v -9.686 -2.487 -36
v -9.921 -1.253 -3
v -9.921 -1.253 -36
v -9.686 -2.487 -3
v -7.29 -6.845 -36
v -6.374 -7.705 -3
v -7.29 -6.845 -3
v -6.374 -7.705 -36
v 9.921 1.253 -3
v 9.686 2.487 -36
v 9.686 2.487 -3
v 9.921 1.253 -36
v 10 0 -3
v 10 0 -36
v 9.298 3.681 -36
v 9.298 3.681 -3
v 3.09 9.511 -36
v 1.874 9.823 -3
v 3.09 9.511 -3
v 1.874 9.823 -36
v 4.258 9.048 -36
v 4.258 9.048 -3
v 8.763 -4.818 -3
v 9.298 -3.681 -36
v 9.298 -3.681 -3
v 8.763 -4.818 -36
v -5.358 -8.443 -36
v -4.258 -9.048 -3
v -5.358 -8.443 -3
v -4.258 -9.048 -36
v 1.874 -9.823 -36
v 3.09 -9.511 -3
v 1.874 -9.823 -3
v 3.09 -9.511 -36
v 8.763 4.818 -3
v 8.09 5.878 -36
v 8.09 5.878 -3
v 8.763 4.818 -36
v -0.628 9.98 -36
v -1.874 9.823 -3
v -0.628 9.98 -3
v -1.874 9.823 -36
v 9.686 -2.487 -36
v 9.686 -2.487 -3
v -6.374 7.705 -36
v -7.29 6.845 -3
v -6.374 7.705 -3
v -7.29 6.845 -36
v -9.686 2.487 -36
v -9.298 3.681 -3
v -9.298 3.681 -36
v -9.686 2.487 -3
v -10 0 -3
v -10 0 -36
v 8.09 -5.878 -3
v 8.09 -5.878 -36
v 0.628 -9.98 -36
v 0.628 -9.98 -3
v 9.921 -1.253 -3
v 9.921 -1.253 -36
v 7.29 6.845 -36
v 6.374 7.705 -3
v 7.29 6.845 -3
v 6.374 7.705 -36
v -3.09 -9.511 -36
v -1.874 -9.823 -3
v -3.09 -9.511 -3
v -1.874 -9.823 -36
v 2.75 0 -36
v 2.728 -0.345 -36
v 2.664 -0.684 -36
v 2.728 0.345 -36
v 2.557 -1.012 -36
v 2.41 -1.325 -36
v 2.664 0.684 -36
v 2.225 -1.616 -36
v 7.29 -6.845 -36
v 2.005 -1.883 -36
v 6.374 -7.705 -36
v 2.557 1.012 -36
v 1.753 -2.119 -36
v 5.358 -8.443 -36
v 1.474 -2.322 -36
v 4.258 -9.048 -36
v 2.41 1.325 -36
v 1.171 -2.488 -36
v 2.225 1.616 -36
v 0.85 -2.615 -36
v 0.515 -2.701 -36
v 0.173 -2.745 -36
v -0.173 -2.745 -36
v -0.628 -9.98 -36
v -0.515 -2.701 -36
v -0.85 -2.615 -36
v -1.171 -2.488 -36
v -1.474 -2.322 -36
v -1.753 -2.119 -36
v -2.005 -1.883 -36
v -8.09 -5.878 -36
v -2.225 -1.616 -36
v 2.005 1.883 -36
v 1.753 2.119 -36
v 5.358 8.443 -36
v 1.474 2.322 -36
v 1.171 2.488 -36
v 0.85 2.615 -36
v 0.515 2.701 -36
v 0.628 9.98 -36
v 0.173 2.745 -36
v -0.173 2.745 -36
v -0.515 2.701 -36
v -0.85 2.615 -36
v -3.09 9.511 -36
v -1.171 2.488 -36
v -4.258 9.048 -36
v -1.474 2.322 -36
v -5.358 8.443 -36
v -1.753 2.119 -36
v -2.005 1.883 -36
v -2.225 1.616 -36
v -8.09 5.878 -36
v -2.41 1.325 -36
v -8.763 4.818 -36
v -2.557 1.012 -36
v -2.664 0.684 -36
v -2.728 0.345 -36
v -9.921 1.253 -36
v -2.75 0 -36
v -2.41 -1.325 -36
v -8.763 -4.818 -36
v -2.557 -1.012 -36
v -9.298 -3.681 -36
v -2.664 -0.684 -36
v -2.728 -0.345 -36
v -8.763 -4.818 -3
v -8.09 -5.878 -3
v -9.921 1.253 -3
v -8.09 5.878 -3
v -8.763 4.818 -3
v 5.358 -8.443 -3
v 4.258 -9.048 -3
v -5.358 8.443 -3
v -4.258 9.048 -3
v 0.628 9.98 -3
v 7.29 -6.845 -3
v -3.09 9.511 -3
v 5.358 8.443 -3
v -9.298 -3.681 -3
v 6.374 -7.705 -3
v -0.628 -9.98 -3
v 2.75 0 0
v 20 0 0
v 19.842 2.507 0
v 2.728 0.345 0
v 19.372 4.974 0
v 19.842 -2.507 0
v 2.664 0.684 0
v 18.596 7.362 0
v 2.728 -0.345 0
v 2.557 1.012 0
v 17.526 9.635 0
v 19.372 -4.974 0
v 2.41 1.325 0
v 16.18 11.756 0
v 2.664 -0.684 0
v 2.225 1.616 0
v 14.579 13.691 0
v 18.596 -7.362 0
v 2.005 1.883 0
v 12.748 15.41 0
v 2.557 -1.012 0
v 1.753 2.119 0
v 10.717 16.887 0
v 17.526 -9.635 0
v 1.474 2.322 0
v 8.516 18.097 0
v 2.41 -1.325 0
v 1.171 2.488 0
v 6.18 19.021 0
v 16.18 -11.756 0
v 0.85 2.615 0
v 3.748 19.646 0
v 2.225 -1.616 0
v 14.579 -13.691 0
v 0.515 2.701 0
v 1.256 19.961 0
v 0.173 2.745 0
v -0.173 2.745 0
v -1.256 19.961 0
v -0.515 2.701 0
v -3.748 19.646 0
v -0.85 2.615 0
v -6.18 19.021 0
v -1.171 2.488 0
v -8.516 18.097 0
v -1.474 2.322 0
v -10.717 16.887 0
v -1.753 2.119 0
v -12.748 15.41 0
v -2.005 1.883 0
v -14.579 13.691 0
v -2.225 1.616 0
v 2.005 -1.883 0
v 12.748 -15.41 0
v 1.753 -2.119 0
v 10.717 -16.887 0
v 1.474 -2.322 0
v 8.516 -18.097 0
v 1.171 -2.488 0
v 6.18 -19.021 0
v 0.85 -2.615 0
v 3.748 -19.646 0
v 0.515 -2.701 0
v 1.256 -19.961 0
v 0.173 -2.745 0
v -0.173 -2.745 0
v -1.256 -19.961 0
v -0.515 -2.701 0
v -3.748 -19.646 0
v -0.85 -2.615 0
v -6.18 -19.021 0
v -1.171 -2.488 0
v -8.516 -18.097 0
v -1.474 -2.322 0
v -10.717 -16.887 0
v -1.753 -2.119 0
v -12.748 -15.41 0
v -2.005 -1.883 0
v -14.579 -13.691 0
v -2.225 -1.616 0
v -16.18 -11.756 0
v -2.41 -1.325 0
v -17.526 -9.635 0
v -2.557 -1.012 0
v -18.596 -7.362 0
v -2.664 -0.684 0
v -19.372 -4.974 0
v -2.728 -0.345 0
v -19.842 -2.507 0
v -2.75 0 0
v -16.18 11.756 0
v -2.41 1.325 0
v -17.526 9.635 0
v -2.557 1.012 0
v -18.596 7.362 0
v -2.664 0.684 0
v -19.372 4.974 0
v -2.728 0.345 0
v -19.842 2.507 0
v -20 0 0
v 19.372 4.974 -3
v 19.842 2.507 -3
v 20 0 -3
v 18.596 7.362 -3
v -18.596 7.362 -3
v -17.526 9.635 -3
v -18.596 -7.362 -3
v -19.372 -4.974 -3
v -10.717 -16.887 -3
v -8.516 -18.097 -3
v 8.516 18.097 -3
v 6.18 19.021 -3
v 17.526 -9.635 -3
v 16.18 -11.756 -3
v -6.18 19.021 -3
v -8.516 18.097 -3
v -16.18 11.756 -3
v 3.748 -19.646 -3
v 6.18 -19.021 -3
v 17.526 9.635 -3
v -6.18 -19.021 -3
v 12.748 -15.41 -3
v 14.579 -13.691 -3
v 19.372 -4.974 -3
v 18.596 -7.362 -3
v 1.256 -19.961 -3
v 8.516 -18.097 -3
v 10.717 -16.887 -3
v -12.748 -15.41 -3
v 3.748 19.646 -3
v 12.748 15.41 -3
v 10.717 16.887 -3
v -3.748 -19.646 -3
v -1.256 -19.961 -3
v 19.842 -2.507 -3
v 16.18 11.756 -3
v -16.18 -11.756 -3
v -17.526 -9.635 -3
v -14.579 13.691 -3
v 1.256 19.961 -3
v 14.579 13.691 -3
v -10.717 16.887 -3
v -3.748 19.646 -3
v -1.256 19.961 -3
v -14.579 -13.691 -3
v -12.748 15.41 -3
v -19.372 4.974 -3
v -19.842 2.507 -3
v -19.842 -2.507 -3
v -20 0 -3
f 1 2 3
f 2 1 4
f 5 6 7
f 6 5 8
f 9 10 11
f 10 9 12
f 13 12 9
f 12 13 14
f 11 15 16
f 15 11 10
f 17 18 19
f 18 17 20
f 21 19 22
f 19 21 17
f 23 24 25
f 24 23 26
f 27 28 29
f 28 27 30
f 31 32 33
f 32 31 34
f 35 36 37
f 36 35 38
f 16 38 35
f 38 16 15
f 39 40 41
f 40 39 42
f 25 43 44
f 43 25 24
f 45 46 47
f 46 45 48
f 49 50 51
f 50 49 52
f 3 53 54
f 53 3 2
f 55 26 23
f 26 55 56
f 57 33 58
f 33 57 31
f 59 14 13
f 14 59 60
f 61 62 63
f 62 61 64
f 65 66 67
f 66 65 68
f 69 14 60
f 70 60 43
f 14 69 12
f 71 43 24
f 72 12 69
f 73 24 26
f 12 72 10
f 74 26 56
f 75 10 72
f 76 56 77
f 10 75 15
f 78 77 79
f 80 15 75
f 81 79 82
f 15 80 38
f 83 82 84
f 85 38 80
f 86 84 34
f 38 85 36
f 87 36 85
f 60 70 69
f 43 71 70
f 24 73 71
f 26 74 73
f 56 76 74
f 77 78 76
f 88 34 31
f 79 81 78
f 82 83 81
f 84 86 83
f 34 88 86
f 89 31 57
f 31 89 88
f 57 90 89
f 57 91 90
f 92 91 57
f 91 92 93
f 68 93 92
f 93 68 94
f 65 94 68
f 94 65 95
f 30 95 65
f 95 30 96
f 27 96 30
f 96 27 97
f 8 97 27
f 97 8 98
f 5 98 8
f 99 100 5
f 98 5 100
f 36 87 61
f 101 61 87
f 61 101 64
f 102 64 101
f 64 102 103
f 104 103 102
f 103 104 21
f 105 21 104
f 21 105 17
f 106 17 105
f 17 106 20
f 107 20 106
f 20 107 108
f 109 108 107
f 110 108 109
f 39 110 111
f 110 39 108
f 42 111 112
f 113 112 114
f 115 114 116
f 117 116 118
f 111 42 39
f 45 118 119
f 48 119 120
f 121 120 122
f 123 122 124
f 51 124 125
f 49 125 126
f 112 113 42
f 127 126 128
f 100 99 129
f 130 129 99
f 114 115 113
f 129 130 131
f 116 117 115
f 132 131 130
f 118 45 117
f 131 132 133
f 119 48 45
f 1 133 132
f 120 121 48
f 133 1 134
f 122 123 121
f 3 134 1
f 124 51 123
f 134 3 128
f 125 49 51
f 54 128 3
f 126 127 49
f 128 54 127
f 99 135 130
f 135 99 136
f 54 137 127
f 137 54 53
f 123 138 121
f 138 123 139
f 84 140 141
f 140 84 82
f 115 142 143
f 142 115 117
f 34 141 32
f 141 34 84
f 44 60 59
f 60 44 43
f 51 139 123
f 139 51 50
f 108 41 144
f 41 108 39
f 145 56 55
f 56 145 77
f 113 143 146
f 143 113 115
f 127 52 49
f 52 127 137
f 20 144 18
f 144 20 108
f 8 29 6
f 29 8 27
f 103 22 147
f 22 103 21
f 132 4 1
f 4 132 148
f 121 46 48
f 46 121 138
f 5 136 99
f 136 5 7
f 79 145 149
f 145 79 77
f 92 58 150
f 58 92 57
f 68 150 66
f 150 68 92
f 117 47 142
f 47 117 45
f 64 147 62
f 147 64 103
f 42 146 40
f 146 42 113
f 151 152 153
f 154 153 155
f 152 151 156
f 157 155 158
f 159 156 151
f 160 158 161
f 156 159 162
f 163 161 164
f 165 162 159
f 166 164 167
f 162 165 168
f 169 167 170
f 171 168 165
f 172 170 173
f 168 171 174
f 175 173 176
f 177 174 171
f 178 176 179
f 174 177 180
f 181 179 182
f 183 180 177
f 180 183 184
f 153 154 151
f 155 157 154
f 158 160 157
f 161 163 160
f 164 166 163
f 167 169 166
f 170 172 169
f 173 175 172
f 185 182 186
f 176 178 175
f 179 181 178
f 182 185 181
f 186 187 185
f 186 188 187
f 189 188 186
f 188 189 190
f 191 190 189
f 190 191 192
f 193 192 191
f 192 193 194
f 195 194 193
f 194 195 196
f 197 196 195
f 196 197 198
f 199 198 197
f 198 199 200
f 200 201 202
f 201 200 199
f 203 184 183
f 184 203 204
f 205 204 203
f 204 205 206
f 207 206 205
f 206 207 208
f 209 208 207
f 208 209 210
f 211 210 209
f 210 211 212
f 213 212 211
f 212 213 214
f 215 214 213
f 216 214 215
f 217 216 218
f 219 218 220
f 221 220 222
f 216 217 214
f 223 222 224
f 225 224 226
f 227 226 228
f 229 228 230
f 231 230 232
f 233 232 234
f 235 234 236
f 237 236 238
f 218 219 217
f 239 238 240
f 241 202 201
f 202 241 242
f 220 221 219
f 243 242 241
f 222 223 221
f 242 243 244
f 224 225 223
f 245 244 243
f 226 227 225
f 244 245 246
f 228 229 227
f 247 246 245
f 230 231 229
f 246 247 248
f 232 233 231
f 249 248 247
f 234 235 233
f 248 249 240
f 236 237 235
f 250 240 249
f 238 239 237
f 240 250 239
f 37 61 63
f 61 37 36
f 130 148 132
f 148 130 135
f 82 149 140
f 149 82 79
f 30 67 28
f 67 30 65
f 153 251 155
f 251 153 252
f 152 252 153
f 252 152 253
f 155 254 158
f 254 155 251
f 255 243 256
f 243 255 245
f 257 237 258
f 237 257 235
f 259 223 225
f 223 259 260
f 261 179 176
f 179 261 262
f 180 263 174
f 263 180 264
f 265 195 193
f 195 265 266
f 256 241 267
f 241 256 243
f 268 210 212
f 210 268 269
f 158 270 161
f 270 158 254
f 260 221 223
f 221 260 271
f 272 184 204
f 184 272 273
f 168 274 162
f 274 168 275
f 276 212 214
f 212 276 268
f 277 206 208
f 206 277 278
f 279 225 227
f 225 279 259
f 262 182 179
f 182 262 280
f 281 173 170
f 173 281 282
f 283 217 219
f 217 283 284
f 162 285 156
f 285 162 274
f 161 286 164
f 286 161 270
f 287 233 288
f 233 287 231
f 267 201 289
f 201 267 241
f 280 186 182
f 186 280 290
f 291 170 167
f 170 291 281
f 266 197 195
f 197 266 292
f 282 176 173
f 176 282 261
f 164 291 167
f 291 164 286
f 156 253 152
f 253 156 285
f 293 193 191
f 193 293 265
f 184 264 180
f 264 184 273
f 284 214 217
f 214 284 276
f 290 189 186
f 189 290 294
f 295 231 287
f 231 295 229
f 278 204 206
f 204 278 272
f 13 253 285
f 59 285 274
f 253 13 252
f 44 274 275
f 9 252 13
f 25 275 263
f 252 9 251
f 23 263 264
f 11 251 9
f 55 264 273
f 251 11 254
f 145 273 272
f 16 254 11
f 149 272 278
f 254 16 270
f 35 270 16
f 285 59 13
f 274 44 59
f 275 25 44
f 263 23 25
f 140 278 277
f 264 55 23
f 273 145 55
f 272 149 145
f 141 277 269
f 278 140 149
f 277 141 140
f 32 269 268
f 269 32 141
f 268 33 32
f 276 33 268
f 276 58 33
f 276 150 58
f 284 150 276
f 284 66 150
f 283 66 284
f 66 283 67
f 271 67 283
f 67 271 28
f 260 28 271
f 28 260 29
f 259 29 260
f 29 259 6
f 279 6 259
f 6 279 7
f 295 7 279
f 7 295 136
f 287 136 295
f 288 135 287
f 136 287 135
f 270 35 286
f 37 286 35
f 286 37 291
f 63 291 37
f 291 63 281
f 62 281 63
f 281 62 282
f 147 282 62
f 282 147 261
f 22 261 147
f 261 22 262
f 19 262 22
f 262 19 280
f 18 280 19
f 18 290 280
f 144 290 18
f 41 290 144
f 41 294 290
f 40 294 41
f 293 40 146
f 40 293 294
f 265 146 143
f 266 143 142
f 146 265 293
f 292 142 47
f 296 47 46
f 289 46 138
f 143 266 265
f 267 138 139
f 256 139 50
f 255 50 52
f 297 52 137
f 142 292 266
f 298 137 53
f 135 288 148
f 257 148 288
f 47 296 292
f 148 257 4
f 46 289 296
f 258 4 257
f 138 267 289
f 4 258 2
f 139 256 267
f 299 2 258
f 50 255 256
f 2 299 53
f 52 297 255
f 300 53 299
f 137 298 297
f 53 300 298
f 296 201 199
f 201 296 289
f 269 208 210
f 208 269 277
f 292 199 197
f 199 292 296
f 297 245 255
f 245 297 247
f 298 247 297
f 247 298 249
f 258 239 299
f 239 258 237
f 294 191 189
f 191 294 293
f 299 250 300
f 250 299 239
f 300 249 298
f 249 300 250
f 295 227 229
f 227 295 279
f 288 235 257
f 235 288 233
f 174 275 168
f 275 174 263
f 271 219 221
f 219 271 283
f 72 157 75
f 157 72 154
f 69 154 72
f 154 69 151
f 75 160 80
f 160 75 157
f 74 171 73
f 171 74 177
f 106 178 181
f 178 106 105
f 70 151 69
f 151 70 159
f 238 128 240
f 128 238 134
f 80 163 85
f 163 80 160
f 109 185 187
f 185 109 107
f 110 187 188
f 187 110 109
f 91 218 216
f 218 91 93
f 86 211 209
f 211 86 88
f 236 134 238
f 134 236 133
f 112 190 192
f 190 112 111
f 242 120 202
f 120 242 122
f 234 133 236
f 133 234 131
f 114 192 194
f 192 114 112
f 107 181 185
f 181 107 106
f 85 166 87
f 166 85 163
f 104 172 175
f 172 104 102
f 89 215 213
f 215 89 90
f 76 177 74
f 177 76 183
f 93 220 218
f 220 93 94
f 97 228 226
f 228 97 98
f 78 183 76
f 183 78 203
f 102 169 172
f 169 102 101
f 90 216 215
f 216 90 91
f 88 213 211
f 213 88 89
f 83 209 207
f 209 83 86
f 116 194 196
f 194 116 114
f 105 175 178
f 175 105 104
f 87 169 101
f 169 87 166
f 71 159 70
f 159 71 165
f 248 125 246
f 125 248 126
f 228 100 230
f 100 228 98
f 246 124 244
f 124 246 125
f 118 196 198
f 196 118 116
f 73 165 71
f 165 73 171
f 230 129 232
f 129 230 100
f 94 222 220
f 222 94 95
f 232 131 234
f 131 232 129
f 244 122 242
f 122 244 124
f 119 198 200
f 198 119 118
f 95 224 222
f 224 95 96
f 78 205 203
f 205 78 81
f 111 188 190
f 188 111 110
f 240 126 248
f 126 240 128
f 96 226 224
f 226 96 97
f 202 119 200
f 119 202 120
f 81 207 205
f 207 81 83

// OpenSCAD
$fn = 50;


difference() {
	union() {
		translate(v = [0, 0, -36.0000000000]) {
			cylinder(h = 36, r = 10.0000000000);
		}
		translate(v = [0, 0, -3.0000000000]) {
			cylinder(h = 3, r = 20.0000000000);
		}
	}
	union() {
		#translate(v = [0, 0, -36]) {
			cylinder(h = 36, r = 2.7500000000);
		}
	}
}
